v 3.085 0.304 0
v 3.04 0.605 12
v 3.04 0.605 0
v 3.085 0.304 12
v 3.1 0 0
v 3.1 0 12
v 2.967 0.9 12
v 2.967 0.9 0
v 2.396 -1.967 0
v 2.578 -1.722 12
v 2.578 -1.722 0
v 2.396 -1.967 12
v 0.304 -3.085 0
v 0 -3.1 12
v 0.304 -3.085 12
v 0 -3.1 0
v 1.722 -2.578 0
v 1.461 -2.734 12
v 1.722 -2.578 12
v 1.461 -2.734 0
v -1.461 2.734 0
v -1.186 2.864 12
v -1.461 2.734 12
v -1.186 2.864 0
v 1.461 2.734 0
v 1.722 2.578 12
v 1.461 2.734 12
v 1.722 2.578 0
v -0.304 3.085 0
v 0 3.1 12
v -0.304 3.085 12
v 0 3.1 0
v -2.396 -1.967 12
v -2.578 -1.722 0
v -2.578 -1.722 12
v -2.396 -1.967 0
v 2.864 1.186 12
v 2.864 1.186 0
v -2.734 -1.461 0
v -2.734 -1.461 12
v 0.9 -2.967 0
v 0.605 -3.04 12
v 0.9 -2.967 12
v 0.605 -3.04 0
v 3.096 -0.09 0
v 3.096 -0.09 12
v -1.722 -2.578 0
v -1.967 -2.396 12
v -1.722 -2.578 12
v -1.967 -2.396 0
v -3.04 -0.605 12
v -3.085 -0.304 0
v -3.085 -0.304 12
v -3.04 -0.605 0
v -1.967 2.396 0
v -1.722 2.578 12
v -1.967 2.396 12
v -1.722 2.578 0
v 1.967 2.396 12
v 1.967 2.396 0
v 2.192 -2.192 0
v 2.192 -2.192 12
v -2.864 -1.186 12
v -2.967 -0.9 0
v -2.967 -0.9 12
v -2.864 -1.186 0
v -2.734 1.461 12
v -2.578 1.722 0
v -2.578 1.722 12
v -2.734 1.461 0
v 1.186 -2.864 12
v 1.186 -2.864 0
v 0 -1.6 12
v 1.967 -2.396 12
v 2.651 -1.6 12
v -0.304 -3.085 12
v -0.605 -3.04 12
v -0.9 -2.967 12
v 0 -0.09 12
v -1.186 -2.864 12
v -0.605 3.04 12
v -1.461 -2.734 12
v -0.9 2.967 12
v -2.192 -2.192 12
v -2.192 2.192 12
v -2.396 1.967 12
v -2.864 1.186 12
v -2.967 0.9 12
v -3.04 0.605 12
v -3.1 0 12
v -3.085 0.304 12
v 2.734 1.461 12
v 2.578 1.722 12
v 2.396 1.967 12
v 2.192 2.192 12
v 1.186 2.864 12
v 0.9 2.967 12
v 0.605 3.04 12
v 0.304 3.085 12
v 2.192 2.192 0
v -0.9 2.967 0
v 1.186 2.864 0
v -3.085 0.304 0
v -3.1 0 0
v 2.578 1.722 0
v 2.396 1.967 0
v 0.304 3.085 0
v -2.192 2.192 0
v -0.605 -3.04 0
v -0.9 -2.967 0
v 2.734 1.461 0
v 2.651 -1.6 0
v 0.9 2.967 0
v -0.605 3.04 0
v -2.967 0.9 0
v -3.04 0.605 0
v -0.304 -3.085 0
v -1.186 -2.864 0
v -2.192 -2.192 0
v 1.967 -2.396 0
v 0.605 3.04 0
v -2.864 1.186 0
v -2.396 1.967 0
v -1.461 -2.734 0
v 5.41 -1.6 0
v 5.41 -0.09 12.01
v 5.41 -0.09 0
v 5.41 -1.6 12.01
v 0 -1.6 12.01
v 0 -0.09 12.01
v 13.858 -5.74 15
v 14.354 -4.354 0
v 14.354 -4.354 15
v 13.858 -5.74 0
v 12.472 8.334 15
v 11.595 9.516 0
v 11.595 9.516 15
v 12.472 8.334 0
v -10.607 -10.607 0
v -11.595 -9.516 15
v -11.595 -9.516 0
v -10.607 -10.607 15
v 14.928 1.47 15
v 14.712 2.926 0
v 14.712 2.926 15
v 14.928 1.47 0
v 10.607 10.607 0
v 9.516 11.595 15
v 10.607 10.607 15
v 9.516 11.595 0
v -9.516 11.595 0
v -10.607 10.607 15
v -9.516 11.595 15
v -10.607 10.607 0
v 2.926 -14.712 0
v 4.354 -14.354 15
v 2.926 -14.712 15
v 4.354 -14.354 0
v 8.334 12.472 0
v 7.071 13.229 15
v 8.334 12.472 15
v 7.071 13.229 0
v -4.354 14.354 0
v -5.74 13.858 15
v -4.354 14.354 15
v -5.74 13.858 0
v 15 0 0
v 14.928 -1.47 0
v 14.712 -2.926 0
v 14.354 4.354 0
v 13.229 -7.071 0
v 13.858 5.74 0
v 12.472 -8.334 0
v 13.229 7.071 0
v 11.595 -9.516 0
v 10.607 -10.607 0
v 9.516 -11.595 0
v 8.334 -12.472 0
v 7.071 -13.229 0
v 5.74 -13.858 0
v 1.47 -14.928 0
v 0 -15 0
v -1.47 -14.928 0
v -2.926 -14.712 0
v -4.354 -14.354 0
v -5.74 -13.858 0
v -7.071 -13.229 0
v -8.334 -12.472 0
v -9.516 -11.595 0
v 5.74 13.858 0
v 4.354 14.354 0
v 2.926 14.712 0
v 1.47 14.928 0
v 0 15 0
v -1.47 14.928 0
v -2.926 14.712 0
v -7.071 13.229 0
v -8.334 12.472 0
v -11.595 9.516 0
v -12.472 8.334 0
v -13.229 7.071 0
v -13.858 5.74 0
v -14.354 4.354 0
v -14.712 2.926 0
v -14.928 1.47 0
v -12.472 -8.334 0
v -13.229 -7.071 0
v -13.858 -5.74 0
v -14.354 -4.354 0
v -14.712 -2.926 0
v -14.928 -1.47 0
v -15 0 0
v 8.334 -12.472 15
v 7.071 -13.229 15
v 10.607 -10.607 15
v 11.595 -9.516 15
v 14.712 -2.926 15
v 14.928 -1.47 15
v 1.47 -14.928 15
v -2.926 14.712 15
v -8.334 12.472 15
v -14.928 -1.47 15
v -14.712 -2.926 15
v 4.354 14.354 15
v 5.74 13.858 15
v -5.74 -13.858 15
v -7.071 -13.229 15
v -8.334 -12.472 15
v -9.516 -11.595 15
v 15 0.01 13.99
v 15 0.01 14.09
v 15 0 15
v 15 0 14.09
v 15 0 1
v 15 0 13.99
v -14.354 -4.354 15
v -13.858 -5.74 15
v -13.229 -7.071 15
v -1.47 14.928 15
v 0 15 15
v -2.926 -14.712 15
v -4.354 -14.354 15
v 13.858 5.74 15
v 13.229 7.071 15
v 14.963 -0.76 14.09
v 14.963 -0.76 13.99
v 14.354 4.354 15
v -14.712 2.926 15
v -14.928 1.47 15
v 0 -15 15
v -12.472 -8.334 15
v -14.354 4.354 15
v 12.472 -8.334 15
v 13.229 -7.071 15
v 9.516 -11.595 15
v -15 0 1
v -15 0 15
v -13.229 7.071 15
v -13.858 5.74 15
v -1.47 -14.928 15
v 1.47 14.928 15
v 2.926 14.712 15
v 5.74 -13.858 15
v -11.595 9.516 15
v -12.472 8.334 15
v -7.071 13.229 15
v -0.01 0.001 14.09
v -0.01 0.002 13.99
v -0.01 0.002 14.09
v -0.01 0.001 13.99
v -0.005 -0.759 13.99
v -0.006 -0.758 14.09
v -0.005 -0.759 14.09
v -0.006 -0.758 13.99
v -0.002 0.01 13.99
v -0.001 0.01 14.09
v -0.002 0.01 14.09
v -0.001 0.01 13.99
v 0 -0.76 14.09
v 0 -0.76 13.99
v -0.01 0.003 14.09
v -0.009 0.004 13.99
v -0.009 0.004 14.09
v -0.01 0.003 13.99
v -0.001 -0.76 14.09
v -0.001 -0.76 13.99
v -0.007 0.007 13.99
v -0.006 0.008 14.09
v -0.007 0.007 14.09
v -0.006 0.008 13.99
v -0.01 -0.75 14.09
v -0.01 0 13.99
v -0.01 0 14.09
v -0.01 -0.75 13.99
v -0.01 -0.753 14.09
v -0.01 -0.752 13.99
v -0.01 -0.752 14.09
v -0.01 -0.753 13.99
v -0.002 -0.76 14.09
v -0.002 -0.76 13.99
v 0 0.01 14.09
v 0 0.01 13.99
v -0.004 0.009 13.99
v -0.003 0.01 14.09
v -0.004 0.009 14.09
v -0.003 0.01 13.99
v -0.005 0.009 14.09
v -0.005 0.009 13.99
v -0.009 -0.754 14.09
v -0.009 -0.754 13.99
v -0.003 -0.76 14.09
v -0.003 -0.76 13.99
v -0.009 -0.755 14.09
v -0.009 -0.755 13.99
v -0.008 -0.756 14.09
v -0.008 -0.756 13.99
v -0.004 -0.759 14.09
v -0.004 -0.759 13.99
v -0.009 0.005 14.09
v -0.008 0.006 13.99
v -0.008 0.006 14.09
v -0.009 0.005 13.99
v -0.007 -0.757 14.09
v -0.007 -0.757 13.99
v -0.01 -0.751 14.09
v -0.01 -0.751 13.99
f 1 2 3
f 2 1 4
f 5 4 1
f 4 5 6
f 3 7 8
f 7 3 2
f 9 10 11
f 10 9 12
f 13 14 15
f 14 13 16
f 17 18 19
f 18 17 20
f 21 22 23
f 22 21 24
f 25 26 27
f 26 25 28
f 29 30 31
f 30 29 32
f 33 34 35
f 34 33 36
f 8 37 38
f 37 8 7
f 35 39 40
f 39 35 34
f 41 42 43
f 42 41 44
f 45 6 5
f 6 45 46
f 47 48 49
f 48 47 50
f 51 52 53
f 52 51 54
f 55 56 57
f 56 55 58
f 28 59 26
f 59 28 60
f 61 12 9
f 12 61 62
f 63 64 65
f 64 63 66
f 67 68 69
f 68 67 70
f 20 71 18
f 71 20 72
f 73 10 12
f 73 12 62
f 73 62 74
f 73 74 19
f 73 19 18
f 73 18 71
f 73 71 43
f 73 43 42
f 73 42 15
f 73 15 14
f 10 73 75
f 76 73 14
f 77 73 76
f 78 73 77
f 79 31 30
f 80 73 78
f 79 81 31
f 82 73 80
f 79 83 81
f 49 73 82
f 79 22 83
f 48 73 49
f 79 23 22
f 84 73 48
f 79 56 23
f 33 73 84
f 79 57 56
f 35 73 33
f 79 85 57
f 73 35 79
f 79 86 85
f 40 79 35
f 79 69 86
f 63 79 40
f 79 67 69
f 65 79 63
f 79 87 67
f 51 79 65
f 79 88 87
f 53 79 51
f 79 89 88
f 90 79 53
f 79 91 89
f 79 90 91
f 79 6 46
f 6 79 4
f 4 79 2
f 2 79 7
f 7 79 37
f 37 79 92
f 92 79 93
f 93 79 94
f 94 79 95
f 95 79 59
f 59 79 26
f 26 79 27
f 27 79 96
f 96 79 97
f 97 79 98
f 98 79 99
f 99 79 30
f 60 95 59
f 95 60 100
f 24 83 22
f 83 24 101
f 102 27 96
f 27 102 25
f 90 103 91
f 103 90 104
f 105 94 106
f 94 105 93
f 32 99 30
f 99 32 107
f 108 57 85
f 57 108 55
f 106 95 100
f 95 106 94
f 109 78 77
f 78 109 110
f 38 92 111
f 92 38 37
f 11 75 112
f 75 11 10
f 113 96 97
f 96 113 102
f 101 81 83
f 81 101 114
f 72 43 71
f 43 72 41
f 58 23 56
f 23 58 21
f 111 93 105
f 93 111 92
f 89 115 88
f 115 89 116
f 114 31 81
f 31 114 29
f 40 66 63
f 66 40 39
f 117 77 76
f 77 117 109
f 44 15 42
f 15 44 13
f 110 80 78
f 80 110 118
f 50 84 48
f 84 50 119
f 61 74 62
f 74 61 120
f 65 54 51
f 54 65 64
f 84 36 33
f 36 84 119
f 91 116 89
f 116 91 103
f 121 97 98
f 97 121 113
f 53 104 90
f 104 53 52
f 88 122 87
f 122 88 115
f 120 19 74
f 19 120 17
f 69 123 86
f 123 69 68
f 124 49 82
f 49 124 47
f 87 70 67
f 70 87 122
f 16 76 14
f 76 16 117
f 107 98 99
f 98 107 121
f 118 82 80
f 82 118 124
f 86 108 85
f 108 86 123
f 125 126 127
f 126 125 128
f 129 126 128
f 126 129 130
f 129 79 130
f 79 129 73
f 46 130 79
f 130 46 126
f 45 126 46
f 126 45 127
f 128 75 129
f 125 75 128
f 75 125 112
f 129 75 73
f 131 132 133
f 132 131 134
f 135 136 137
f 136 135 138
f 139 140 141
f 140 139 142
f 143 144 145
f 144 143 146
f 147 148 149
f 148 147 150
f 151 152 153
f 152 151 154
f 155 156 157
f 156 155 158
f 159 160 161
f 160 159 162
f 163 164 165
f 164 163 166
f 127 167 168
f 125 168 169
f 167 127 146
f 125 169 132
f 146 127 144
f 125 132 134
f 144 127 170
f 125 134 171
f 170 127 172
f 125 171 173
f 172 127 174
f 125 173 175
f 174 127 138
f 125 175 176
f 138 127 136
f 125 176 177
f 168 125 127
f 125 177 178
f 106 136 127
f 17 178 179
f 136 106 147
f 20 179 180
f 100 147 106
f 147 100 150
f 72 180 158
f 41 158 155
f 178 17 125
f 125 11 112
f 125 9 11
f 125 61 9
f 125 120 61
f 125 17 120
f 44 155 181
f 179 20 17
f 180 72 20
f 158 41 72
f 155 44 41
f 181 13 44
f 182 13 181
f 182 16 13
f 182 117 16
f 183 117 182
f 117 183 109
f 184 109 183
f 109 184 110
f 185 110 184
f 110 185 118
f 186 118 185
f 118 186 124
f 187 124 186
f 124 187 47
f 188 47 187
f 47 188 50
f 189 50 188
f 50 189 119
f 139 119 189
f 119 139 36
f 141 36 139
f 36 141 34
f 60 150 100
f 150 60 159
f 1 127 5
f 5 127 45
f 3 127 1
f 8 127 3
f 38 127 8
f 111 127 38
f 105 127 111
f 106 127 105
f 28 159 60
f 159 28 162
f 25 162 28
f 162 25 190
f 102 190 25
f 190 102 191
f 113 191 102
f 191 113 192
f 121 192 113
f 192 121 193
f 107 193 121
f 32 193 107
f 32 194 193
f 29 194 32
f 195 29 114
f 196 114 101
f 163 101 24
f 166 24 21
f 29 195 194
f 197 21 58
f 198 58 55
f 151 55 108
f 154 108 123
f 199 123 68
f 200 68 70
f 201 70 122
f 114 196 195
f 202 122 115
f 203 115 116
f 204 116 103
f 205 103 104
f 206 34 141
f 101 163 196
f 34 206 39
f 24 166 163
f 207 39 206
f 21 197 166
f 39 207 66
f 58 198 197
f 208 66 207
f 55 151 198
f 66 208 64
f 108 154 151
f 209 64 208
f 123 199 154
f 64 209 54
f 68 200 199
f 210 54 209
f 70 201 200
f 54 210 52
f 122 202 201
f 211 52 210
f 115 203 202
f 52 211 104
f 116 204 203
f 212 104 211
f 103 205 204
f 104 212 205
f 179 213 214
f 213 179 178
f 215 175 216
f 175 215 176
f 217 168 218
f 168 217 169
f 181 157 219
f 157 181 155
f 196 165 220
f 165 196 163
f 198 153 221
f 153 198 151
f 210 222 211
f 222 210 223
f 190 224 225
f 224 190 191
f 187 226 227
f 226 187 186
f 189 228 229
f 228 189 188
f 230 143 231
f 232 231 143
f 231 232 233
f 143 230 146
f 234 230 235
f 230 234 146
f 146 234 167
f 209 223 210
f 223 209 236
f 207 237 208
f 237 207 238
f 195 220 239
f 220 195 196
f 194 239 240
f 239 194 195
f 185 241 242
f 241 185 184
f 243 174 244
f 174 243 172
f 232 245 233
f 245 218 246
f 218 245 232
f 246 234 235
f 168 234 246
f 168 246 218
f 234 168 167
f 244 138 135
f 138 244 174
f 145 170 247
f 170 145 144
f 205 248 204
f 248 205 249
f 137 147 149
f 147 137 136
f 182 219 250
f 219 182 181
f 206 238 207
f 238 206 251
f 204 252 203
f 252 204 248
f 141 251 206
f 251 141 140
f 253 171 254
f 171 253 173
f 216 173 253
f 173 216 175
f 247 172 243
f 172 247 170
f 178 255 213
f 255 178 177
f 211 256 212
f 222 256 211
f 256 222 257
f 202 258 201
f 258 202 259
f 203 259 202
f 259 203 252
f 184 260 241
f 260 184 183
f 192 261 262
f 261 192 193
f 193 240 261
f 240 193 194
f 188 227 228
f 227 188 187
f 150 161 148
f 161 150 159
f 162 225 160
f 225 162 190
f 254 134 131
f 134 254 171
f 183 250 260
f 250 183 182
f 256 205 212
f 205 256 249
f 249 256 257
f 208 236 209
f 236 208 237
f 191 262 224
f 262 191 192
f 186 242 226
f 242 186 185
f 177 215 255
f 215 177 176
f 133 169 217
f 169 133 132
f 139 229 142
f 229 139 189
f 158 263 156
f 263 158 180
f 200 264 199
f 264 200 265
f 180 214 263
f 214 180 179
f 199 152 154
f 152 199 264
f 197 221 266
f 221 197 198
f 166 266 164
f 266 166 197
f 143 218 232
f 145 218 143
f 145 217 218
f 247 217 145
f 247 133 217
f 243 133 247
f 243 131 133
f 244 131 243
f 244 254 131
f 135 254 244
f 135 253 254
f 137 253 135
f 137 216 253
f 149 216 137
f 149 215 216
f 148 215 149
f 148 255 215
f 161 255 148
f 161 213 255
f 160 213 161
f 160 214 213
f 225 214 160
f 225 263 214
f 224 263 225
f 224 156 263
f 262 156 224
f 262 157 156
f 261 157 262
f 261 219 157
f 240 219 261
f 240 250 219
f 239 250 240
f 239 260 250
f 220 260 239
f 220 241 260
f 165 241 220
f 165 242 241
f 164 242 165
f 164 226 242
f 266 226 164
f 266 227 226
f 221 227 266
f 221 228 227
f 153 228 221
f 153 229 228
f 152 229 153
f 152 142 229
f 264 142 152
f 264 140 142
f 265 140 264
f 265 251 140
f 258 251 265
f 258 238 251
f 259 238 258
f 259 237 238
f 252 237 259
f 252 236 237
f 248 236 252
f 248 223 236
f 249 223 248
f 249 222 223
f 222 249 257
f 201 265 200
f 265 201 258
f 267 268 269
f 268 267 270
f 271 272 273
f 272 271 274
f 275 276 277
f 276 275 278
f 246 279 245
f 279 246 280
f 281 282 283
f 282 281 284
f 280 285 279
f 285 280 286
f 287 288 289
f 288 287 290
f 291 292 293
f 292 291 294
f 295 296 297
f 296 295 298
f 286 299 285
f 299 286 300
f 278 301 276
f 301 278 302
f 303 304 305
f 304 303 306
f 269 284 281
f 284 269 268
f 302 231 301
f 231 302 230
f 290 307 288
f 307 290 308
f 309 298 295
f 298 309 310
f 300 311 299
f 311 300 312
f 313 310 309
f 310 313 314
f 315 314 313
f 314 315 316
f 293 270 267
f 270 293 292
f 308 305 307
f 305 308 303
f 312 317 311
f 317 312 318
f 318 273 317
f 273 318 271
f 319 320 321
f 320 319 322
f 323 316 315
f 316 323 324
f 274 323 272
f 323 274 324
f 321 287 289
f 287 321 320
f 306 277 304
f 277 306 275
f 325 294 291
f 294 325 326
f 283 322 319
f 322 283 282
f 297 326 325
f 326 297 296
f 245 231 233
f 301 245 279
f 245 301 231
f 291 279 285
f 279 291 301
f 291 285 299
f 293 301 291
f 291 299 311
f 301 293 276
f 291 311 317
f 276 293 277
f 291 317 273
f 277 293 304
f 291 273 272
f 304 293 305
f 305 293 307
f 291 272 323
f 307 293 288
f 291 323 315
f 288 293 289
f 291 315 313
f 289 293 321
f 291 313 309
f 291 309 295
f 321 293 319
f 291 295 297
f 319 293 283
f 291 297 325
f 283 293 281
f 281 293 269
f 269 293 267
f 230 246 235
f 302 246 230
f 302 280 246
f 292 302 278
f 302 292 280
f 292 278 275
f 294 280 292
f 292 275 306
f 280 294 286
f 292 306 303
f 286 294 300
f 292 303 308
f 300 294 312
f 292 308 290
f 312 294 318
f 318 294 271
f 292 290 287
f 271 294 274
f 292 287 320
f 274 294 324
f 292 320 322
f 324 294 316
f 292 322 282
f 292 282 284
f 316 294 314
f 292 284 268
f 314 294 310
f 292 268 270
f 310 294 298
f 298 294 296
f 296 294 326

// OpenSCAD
// Replacement knob for hotplate stirrer with 6 mm D-shaft
// Dimensions from user specification

$fn = 64;

// Main knob dimensions
knob_diameter = 30;
knob_height = 15;

// D-shaft bore dimensions
d_shaft_diameter = 6.2;
d_shaft_radius = d_shaft_diameter / 2;
d_shaft_flat_to_opposite = 4.7;
d_shaft_depth = 12;

// Calculate position of the flat cut
// Distance from center to flat = d_shaft_radius - d_shaft_flat_to_opposite
// Since d_shaft_flat_to_opposite > d_shaft_radius, this is negative (flat is on other side of center)
flat_distance_from_center = d_shaft_radius - d_shaft_flat_to_opposite;  // = 3.1 - 4.7 = -1.6

// Grip groove dimensions
groove_diameter = 2;
num_grooves = 18;

// Pointer groove dimensions
pointer_width = 1.5;
pointer_depth = 1;

module knob() {
    // Main cylinder
    cylinder(h = knob_height, r = knob_diameter / 2, center = false);
}

module d_shaft_bore() {
    // First create the full cylinder for the bore
    translate([0, 0, -0.01]) {
        cylinder(h = d_shaft_depth + 0.01, r = d_shaft_radius, center = false);
    }
    
    // Calculate chord width at the flat position
    // The flat is at y = flat_distance_from_center (negative value)
    // Width = 2 * sqrt(r^2 - y^2)
    chord_width = 2 * sqrt(d_shaft_radius * d_shaft_radius - flat_distance_from_center * flat_distance_from_center);
    
    // Cut the flat side: subtract a rectangular prism
    // The flat is at y = flat_distance_from_center, and extends to y = -d_shaft_radius (bottom of circle)
    // Since flat_distance_from_center is negative, this means the cut is from the bottom up to the flat position
    translate([0, flat_distance_from_center, -0.01]) {
        cube([chord_width + 0.1, d_shaft_radius - abs(flat_distance_from_center) + 0.01, d_shaft_depth + 0.02], center = false);
    }
}

module grip_grooves() {
    radius = knob_diameter / 2;
    for (i = [0 : num_grooves - 1]) {
        angle = (i * 360) / num_grooves;
        rotate([0, 0, angle]) {
            translate([radius, 0, 0]) {
                rotate([0, 90, 0]) {
                    cylinder(h = knob_height + 0.1, r = groove_diameter / 2, center = false);
                }
            }
        }
    }
}

module pointer_groove() {
    // Pointer groove runs from center to outer edge on the same side as the D-shaft flat
    // Since the flat is on the negative Y side (based on our calculation), pointer is on negative Y side
    // Width = 1.5 mm, depth = 1 mm
    // Create a triangular wedge shape on the negative Y side
    translate([0, 0, knob_height - pointer_depth - 0.01]) {
        hull() {
            // Center point
            translate([0, 0, 0]) {
                cylinder(h = 0.1, r = 0.01, center = false);
            }
            // Outer edge point (at knob radius)
            translate([knob_diameter / 2, 0, 0]) {
                cylinder(h = 0.1, r = 0.01, center = false);
            }
            // Add width by extending in negative Y direction
            translate([0, -pointer_width / 2, 0]) {
                cylinder(h = 0.1, r = 0.01, center = false);
            }
            translate([knob_diameter / 2, -pointer_width / 2, 0]) {
                cylinder(h = 0.1, r = 0.01, center = false);
            }
        }
    }
}

// Build the final part
difference() {
    knob();
    d_shaft_bore();
    grip_grooves();
    pointer_groove();
}
